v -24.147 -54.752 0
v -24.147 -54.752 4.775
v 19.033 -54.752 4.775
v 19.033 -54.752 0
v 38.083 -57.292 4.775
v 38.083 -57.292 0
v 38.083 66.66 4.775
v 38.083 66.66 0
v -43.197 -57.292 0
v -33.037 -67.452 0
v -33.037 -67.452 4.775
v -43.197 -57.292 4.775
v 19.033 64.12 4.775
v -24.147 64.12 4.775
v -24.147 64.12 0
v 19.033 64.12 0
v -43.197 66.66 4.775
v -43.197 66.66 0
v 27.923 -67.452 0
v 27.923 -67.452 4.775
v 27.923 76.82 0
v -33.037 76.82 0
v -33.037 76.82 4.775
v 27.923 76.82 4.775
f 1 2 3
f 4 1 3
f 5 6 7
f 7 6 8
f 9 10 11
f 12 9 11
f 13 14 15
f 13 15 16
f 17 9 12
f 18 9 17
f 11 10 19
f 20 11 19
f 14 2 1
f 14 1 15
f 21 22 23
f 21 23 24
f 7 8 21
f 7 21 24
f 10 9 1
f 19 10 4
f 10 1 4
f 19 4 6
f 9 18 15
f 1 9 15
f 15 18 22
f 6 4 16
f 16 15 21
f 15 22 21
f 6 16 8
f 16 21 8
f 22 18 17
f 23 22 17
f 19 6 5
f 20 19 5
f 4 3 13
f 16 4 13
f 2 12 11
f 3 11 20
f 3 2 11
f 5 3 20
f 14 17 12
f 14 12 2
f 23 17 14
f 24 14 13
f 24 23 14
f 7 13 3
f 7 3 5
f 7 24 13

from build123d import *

# Parameters (mm, degrees)
F0_W     = 81.28
F0_H     = 144.272
F1_DEPTH = 4.7752
F2_W     = 43.18
F2_H     = 118.872
F3_DEPTH = 25.4
F4_SIZE  = 10.16


with BuildPart() as f1:
    # F0 (on Top) → F1 (new body)
    with BuildSketch(Plane.XY):
        with Locations((-2.556553, 4.684015)):
            Rectangle(F0_W, F0_H)
    extrude(amount=F1_DEPTH)

    # F2 (on face) → F3 (cut)
    with BuildSketch(Plane.XY.offset(4.7752)):
        with Locations((-2.556553, 4.684015)):
            Rectangle(F2_W, F2_H)
    extrude(amount=-F3_DEPTH, mode=Mode.SUBTRACT)

    # F4
    f4_edges = [f1.edges().sort_by_distance(p)[0] for p in [
        (38.083447, -67.451985, 2.3876),
        (-43.196553, -67.451985, 2.3876),
        (38.083447, 76.820015, 2.3876),
        (-43.196553, 76.820015, 2.3876),
    ]]
    chamfer(f4_edges, length=F4_SIZE)


solid = f1.part
